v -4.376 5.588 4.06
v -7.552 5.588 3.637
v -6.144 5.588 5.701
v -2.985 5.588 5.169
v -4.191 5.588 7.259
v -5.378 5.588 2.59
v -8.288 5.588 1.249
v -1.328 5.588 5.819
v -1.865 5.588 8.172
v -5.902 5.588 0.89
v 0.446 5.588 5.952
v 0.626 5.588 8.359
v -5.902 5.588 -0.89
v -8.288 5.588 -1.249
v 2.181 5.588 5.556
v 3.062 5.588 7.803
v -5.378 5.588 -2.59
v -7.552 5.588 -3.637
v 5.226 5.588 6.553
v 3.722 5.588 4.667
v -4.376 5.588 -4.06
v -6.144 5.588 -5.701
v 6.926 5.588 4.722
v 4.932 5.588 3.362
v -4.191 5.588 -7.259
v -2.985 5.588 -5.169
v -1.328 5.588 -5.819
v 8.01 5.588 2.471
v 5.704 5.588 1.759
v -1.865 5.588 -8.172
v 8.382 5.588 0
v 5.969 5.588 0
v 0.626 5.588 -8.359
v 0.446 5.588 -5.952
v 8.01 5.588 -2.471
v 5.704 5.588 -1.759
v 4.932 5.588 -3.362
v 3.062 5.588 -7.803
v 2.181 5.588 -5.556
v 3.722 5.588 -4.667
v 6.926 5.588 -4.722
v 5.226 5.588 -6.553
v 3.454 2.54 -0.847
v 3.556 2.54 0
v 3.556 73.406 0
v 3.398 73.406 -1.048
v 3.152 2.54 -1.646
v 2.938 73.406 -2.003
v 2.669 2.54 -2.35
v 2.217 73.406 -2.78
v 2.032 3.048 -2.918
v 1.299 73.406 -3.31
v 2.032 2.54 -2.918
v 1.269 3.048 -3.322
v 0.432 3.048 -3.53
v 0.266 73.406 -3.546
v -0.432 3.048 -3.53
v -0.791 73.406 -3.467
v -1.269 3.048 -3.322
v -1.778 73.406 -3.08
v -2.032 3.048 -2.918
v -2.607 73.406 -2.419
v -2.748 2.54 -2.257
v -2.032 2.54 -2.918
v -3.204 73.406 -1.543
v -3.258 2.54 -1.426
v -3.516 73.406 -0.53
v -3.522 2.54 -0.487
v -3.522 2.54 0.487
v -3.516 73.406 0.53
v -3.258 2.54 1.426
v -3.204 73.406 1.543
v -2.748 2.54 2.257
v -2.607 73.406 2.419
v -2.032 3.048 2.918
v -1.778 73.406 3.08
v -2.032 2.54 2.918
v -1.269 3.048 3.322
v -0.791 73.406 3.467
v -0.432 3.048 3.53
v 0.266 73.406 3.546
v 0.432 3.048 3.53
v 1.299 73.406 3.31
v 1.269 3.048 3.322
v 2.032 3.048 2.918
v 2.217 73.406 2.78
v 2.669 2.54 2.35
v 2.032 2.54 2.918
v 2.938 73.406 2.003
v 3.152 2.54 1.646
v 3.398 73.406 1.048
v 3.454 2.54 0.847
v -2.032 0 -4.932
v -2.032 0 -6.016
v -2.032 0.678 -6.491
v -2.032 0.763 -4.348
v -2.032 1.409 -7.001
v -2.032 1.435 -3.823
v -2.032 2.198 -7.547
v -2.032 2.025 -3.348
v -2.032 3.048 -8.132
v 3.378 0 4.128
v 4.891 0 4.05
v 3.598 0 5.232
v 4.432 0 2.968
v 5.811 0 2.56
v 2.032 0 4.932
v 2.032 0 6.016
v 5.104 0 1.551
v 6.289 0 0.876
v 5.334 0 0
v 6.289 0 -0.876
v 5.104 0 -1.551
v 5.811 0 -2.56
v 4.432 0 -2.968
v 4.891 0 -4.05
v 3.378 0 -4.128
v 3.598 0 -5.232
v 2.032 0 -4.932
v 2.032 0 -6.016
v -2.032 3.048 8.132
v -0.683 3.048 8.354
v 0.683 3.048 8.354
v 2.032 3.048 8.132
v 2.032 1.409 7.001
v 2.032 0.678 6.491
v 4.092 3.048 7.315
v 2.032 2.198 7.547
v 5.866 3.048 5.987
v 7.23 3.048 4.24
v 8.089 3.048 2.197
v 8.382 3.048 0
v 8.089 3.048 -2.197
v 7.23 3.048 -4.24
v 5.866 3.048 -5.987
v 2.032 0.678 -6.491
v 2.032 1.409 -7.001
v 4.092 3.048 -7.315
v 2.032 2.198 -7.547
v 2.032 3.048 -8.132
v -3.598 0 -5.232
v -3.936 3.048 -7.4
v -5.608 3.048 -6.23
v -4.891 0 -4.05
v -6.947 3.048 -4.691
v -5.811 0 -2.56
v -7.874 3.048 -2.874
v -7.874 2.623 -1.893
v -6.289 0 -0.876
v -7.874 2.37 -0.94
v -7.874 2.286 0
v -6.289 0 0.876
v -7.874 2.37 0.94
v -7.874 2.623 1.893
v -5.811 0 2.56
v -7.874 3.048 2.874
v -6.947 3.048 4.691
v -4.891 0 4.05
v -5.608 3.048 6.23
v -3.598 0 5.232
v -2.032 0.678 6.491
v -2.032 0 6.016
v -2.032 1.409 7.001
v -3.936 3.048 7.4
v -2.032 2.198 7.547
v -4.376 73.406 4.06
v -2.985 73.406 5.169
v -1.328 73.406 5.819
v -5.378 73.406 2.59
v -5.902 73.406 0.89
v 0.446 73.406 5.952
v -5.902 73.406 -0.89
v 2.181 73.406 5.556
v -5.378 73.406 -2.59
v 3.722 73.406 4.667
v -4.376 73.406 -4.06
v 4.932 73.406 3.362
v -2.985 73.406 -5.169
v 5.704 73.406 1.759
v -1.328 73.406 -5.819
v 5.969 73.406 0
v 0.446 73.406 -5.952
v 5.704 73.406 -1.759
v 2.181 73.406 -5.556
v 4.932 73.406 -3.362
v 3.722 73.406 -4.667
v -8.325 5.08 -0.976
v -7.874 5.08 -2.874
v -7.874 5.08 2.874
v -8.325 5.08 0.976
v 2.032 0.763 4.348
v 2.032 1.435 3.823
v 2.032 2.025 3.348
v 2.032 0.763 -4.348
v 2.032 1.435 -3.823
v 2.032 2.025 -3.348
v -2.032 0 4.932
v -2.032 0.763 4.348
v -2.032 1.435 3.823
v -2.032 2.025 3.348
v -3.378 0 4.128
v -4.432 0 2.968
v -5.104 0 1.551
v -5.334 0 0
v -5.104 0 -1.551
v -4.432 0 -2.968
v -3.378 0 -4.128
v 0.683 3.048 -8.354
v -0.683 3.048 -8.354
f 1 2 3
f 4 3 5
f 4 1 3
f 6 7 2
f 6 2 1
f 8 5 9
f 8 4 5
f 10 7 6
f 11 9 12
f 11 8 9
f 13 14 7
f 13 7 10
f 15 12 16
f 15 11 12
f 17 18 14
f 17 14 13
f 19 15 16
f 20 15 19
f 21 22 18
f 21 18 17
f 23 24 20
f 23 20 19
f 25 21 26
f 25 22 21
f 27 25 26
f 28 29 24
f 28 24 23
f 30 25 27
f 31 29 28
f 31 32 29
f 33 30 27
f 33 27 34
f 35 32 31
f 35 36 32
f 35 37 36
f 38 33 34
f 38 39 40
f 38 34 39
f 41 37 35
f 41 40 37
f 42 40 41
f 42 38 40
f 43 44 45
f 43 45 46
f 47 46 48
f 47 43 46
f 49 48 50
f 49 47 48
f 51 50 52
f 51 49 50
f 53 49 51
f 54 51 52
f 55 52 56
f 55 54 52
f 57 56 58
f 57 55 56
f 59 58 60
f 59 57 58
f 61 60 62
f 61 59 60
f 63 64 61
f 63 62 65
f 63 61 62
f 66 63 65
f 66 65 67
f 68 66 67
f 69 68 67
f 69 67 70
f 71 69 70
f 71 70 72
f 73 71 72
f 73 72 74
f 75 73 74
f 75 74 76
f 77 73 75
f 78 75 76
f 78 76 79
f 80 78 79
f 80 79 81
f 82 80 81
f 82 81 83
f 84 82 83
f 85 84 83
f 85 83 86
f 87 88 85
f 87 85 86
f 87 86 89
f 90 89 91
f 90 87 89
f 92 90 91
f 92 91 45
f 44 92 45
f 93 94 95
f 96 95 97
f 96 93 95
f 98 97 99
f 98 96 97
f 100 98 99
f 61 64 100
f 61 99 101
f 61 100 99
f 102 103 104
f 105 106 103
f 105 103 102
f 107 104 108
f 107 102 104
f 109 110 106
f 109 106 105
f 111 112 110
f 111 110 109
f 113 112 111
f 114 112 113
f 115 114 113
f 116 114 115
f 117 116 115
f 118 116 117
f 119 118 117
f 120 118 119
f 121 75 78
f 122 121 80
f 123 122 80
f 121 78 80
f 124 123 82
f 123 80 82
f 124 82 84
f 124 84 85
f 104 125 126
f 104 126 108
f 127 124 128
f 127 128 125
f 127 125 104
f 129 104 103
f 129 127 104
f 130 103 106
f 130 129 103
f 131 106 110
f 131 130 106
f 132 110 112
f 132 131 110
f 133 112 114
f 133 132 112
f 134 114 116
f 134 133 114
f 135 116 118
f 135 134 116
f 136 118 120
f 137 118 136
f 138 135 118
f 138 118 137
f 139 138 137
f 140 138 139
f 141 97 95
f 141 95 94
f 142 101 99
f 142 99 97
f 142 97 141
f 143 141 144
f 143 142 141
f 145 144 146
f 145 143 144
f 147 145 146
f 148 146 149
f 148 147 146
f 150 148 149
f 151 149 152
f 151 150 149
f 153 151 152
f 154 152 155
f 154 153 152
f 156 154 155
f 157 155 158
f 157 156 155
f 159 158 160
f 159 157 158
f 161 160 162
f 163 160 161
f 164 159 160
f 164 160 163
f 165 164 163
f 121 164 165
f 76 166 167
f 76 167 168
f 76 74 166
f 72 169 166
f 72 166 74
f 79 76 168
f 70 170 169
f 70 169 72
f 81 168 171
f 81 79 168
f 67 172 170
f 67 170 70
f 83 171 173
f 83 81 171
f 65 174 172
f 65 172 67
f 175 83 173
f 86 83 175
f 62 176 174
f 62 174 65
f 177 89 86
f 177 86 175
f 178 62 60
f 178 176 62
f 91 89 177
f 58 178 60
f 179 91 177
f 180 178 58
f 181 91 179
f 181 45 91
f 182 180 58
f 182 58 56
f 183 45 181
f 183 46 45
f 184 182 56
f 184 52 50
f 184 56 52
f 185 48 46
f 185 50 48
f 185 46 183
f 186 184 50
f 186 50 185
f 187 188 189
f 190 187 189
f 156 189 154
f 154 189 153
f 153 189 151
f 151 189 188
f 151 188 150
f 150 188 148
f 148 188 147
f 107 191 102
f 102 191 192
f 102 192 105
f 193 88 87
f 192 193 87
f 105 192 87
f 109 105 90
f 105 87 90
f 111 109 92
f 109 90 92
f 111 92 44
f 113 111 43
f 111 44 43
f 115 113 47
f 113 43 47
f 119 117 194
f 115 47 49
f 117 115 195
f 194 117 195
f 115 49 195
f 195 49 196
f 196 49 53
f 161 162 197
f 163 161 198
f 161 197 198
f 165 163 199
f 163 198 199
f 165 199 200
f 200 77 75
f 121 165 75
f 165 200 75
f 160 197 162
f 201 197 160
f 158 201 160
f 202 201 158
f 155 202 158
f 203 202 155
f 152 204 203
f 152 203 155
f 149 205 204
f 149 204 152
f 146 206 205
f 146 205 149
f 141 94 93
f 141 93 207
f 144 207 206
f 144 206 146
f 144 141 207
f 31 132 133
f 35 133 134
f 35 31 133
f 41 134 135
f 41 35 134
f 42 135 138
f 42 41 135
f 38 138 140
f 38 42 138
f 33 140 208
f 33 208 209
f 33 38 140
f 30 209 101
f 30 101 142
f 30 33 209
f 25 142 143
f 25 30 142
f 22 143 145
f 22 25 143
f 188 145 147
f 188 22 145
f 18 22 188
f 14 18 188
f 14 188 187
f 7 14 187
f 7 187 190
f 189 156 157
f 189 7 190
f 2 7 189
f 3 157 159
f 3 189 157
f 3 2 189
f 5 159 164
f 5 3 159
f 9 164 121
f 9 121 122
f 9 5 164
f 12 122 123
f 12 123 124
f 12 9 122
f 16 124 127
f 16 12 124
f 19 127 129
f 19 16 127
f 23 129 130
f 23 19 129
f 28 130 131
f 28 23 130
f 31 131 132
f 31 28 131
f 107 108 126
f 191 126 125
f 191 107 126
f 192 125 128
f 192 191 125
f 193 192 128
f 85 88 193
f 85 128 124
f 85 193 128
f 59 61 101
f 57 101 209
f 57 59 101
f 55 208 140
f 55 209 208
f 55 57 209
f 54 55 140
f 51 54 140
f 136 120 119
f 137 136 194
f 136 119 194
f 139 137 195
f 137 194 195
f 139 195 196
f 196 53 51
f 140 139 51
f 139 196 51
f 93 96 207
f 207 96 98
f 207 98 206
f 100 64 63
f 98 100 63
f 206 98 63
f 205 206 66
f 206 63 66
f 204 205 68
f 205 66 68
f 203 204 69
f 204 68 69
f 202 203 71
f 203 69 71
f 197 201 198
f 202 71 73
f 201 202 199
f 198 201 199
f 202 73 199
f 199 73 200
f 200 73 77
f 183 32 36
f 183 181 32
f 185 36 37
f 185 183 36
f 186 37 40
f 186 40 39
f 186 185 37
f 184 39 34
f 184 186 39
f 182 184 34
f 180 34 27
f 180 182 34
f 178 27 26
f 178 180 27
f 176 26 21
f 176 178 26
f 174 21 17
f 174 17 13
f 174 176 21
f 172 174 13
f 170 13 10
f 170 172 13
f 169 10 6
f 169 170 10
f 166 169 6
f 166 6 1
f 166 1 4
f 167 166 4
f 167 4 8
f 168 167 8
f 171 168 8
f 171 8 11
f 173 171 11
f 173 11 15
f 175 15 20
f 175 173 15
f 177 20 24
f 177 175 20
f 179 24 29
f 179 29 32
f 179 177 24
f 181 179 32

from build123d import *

# Parameters (mm, degrees)
CHAMFER2_SIZE           = 1.778
CHAMFER2_SIZE2          = 2.54
SKETCH2_W               = 4.064
SKETCH2_H               = 3.048
CUT_EXTRUDE1_DEPTH      = 9.382
CUT_EXTRUDE1_DEPTH_BACK = 9.382
CUT_EXTRUDE2_DEPTH      = 9.382
CUT_EXTRUDE2_DEPTH_BACK = 9.382


with BuildPart() as part:
    # Sketch1 → Base-Revolve (revolve)
    with BuildSketch(Plane.XY):
        Polygon((3.556, 73.406), (3.556, 0), (6.35, 0), (8.382, 3.048), (8.382, 5.588), (5.969, 5.588), (5.969, 73.406), align=None)
    revolve(axis=Axis((0, 0, 0), (0, 1, 0)))

    # Chamfer2
    chamfer2_edges = [part.edges().sort_by_distance(p)[0] for p in [
        (-3.556, 0, 0),
    ]]
    chamfer2_side = [part.faces().sort_by_distance(p)[0] for p in [
        (-3.735605122, 0, 0),
    ]]
    chamfer(chamfer2_edges, length=CHAMFER2_SIZE, length2=CHAMFER2_SIZE2, reference=chamfer2_side[0])

    # Sketch2 → Cut-Extrude1 (cut, two sides)
    with BuildSketch(Plane.XY) as cut_extrude1_sk:
        with Locations((0, 1.524)):
            Rectangle(SKETCH2_W, SKETCH2_H)
    extrude(amount=CUT_EXTRUDE1_DEPTH, mode=Mode.SUBTRACT)
    extrude(cut_extrude1_sk.sketch, amount=-CUT_EXTRUDE1_DEPTH_BACK, mode=Mode.SUBTRACT)

    # Sketch3 → Cut-Extrude2 (cut, two sides)
    with BuildSketch(Plane.XY) as cut_extrude2_sk:
        Polygon((-7.874, 5.08), (-7.874, 2.286), (-8.382, 3.048), (-8.382, 5.08), align=None)
    extrude(amount=CUT_EXTRUDE2_DEPTH, mode=Mode.SUBTRACT)
    extrude(cut_extrude2_sk.sketch, amount=-CUT_EXTRUDE2_DEPTH_BACK, mode=Mode.SUBTRACT)


solid = part.part
